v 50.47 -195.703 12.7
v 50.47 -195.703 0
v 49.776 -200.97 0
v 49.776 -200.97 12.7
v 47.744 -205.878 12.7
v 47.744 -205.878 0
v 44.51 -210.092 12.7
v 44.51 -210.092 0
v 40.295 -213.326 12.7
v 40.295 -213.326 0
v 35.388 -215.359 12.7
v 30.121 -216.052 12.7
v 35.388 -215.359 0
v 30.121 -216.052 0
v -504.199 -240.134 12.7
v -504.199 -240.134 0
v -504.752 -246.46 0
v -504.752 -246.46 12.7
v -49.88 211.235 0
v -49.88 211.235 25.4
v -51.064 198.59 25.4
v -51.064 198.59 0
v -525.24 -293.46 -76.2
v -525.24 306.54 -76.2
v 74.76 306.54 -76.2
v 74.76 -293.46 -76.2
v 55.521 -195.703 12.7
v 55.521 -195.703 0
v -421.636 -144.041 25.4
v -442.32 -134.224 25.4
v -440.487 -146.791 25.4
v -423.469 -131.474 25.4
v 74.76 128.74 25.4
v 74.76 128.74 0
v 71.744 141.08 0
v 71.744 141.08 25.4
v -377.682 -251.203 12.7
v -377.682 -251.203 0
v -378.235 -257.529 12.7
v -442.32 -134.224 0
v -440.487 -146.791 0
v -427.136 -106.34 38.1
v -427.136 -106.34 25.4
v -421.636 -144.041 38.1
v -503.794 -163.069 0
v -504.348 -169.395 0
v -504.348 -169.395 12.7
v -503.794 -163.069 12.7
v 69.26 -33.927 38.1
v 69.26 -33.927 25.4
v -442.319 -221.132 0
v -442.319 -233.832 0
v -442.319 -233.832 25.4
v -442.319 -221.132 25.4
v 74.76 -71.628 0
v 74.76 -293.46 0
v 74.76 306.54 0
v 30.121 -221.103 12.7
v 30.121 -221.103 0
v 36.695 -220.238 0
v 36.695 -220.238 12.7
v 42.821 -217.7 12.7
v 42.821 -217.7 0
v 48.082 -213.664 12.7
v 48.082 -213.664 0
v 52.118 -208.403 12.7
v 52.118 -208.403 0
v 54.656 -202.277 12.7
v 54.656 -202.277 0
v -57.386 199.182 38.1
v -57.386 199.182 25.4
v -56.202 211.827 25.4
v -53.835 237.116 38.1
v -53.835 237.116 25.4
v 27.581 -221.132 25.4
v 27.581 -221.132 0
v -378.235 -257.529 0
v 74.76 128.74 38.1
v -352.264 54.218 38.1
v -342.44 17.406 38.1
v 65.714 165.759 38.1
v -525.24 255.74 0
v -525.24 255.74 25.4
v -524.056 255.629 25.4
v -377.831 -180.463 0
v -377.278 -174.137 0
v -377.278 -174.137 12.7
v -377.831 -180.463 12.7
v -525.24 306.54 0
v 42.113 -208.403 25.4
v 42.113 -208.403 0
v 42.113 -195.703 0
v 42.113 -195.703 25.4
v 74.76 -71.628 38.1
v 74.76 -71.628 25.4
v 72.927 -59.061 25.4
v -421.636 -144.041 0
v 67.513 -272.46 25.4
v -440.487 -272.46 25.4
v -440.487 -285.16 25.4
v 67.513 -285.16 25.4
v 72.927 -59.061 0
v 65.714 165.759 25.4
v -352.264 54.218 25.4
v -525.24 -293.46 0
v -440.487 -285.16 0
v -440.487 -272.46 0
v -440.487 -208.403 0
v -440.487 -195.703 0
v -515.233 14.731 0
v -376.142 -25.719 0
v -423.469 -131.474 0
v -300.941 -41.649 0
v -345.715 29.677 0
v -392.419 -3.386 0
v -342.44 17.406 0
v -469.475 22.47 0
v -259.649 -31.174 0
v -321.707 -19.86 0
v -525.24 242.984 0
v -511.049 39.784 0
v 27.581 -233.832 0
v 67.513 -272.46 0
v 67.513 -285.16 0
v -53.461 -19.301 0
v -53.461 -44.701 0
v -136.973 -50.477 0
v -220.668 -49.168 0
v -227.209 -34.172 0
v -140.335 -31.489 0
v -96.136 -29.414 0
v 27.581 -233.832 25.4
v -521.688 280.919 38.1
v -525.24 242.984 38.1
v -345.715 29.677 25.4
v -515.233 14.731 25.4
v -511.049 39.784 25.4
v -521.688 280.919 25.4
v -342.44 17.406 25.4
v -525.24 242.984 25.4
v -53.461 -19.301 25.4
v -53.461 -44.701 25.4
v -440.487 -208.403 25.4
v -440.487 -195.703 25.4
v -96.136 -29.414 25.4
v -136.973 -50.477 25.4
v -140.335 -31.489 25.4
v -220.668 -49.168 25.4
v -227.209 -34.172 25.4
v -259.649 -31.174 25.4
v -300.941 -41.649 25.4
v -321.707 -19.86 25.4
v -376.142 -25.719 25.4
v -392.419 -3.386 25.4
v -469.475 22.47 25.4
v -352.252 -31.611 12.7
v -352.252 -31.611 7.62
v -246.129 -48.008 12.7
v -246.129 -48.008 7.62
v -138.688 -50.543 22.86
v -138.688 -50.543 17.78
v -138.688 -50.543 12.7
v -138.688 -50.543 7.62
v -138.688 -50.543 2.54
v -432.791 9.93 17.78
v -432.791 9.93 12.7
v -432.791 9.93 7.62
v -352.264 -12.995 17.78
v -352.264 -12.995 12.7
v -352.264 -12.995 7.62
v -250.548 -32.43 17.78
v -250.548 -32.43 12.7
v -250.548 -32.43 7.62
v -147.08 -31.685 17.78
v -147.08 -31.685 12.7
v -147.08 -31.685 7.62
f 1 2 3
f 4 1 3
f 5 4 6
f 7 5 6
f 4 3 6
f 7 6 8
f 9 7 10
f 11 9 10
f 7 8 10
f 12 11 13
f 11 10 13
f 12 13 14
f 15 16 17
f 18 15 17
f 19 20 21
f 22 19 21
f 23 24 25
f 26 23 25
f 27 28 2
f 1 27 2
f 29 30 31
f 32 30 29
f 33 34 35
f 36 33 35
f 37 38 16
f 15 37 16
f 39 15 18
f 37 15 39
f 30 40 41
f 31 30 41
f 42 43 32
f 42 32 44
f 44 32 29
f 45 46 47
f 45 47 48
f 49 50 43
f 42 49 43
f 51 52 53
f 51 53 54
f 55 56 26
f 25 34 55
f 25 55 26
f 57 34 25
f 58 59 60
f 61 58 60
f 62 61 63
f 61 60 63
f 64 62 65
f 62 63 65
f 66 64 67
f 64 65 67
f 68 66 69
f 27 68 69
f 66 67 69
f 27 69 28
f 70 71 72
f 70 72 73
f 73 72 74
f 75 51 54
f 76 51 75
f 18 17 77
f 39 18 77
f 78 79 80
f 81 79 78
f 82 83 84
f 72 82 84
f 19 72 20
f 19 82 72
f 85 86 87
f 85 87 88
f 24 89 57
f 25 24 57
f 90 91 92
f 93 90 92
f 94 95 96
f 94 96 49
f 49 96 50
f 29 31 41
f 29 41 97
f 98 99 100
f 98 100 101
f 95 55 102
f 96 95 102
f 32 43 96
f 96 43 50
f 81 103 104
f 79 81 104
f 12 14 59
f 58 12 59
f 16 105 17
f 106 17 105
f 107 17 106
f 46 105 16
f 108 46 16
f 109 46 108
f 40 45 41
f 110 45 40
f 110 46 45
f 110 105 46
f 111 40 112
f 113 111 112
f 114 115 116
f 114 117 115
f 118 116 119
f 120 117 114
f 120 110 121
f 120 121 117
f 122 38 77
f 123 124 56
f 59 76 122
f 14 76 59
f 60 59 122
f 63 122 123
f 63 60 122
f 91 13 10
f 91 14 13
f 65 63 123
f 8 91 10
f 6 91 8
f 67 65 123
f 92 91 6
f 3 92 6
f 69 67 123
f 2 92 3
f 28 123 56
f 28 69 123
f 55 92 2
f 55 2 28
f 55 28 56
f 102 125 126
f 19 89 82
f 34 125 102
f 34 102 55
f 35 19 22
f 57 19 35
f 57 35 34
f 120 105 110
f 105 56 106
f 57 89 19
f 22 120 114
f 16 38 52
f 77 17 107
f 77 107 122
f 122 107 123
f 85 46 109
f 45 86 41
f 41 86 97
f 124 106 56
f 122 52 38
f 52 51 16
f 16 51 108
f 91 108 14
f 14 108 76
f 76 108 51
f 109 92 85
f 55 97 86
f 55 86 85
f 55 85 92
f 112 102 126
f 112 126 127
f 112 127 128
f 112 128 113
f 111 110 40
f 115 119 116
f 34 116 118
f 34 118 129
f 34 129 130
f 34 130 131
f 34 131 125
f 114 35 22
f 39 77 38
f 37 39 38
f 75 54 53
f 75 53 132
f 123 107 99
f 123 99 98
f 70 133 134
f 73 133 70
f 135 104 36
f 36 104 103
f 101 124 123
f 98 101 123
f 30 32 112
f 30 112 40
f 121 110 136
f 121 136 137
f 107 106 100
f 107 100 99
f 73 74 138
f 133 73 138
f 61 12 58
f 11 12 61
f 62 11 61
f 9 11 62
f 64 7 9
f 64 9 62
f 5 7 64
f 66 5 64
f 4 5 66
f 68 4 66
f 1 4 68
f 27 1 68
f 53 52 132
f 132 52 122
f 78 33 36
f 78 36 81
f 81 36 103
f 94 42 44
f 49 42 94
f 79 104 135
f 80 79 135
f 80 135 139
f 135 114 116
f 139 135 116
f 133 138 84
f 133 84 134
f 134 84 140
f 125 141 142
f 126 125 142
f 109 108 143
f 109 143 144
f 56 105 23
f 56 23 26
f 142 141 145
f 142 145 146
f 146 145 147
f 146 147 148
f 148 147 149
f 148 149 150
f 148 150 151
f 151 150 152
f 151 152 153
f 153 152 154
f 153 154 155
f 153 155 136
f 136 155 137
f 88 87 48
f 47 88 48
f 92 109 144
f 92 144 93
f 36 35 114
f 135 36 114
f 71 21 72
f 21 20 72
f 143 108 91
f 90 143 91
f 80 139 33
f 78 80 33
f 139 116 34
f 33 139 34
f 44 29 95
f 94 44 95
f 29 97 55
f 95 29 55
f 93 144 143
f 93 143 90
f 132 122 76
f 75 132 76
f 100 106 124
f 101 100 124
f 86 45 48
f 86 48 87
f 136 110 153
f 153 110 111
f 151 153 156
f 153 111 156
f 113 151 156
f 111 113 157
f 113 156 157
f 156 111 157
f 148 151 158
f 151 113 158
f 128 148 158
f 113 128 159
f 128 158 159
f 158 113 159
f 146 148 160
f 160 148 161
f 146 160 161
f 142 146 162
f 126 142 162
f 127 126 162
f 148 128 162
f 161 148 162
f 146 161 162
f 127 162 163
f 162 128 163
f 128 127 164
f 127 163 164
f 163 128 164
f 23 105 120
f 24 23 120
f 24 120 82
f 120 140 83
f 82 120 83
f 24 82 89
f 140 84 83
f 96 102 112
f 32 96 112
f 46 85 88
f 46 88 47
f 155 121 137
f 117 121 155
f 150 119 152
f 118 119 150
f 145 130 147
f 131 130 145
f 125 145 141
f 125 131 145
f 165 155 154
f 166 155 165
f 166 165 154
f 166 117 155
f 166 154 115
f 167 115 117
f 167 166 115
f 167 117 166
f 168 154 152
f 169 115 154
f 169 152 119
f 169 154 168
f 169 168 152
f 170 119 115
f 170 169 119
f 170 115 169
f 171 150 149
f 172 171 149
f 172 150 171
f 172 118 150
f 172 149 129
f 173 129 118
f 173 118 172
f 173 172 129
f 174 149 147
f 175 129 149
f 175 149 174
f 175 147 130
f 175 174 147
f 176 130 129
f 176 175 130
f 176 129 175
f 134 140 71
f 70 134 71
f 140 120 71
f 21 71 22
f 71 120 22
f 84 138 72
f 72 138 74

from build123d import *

# Parameters (mm, degrees)
SKETCH1_W            = 600
SKETCH1_H            = 600
BOSS_EXTRUDE1_DEPTH  = 76.2
BOSS_EXTRUDE2_DEPTH  = 25.4
BOSS_EXTRUDE3_START  = 25.4
BOSS_EXTRUDE3_DEPTH  = 12.7
BOSS_EXTRUDE4_DEPTH  = 25.4
BOSS_EXTRUDE5_START  = 25.4
BOSS_EXTRUDE5_DEPTH  = 12.7
BOSS_EXTRUDE6_DEPTH  = 25.4
SKETCH1_42_W         = 482.6
SKETCH1_42_H         = 12.7
SKETCH1_42_W_2       = 469.9
SKETCH1_42_W_3       = 508
BOSS_EXTRUDE7_DEPTH  = 25.4
BOSS_EXTRUDE8_DEPTH  = 12.7
BOSS_EXTRUDE9_START  = 25.4
BOSS_EXTRUDE9_DEPTH  = 12.7
BOSS_EXTRUDE10_DEPTH = 25.4


with BuildPart() as part:
    # Sketch1 → Boss-Extrude1 (new body)
    with BuildSketch(Plane.XY):
        with Locations((-225.240056073, 6.540000857)):
            Rectangle(SKETCH1_W, SKETCH1_H)
    extrude(amount=-BOSS_EXTRUDE1_DEPTH)

    # Sketch1<22> → Boss-Extrude2 (add)
    with BuildSketch(Plane.XY):
        Polygon((-525.240056073, 242.984461231), (-525.240056073, 255.740000857), (-49.879871206, 211.234703059), (-51.063723483, 198.590000857), align=None)
    extrude(amount=BOSS_EXTRUDE2_DEPTH)

    # Sketch1<23> → Boss-Extrude3 (add)
    with BuildSketch(Plane.XY.offset(BOSS_EXTRUDE3_START)):
        Polygon((-525.240056073, 242.984461231), (-57.386074584, 199.181926995), (-53.834517754, 237.116033602), (-521.688499243, 280.918567838), align=None)
    extrude(amount=BOSS_EXTRUDE3_DEPTH)

    # Sketch1<36> → Boss-Extrude4 (add)
    with BuildSketch(Plane.XY):
        Polygon((-342.440287545, 17.406237518), (74.759943927, 128.740000857), (71.744479474, 141.079727937), (-345.714809996, 29.676832561), align=None)
    extrude(amount=BOSS_EXTRUDE4_DEPTH)

    # Sketch1<38> → Boss-Extrude5 (add)
    with BuildSketch(Plane.XY.offset(BOSS_EXTRUDE5_START)):
        Polygon((-342.440287545, 17.406237518), (74.759943927, 128.740000857), (65.713550566, 165.759182097), (-352.263854899, 54.218022648), align=None)
    extrude(amount=BOSS_EXTRUDE5_DEPTH)

    # Sketch1<39> → Boss-Extrude6 (add)
    with BuildSketch(Plane.XY):
        with BuildLine():
            Line((-515.232510143, 14.731286418), (-511.049397451, 39.784461231))
            add(Edge.make_bspline(
                [(-511.049397451, 39.784461231), (-491.91342743, 29.210221806), (-458.77856372, 19.531721492), (-416.625986292, 3.959066392), (-383.903580076, -6.249374557), (-350.315397205, -13.252889549), (-315.502078412, -21.570378936), (-279.518469533, -27.808056985), (-243.831298859, -34.151990356), (-199.456462469, -34.752149035), (-135.713837898, -30.00036949), (-83.078004242, -31.661348956), (-53.461097288, -19.3009415)],
                knots=[0, 0, 0, 0, 0.138195141, 0.220153512, 0.28706639, 0.356885041, 0.439197272, 0.515633138, 0.590194642, 0.670343679, 0.797980141, 1, 1, 1, 1], degree=3))
            Line((-53.461097288, -19.3009415), (-53.461097288, -44.7009415))
            add(Edge.make_bspline(
                [(-515.232510143, 14.731286418), (-492.287448082, 7.361196537), (-460.683716745, -0.781157172), (-419.974441586, -13.502513213), (-388.83188488, -22.419811825), (-355.455504677, -31.276728095), (-317.590964539, -38.781286591), (-279.774049612, -45.52299243), (-241.592265326, -48.592909593), (-194.728275521, -49.903260595), (-132.907153847, -52.623676823), (-81.911313969, -45.613021801), (-53.461097288, -44.7009415)],
                knots=[0, 0, 0, 0, 0.153828341, 0.208264646, 0.272296669, 0.360672756, 0.428620212, 0.51872685, 0.605764862, 0.672841047, 0.818182432, 1, 1, 1, 1], degree=3))
        make_face()
    extrude(amount=BOSS_EXTRUDE6_DEPTH)

    # Sketch1<42> → Boss-Extrude7 (add)
    with BuildSketch(Plane.XY):
        with Locations((-199.186590665, -202.053329244)):
            Rectangle(SKETCH1_42_W, SKETCH1_42_H)
        with Locations((-207.36885806, -227.48194535)):
            Rectangle(SKETCH1_42_W_2, SKETCH1_42_H)
        with Locations((-186.486590665, -278.810327036)):
            Rectangle(SKETCH1_42_W_3, SKETCH1_42_H)
    extrude(amount=BOSS_EXTRUDE7_DEPTH)

    # Sketch1<43> → Boss-Extrude8 (add)
    with BuildSketch(Plane.XY):
        Polygon((-377.277754824, -174.137492911), (-503.794481482, -163.068713582), (-504.347920448, -169.394549915), (-377.831193791, -180.463329244), align=None)
        with BuildLine():
            Line((55.52114194, -195.703329244), (50.469758046, -195.703329244))
            ThreePointArc((50.469758046, -195.703329244), (44.509786376, -210.09197368), (30.12114194, -216.05194535))
            Line((30.12114194, -216.05194535), (30.12114194, -221.103329244))
            ThreePointArc((30.12114194, -221.103329244), (48.081654182, -213.663841486), (55.52114194, -195.703329244))
        make_face()
        Polygon((-504.198568844, -240.134266294), (-504.752007811, -246.460102627), (-378.235281153, -257.528881956), (-377.681842187, -251.203045623), align=None)
    extrude(amount=BOSS_EXTRUDE8_DEPTH)



with BuildPart() as body_2:
    # Sketch1<46> → Boss-Extrude9 (new body)
    with BuildSketch(Plane.XY.offset(BOSS_EXTRUDE9_START)):
        Polygon((74.759943927, -71.628181651), (69.260201501, -33.927215705), (-427.135850118, -106.340490986), (-421.636107692, -144.041456932), align=None)
    extrude(amount=BOSS_EXTRUDE9_DEPTH)


with BuildPart() as part_1:
    add(part.part)

    add(body_2.part)  # Boss-Extrude10 merges body 2
    # Sketch1<47> → Boss-Extrude10 (add)
    with BuildSketch(Plane.XY):
        Polygon((74.759943927, -71.628181651), (72.926696452, -59.061193002), (-442.31983814, -134.224339496), (-440.486590665, -146.791328145), align=None)
    extrude(amount=BOSS_EXTRUDE10_DEPTH)


solid = part_1.part
